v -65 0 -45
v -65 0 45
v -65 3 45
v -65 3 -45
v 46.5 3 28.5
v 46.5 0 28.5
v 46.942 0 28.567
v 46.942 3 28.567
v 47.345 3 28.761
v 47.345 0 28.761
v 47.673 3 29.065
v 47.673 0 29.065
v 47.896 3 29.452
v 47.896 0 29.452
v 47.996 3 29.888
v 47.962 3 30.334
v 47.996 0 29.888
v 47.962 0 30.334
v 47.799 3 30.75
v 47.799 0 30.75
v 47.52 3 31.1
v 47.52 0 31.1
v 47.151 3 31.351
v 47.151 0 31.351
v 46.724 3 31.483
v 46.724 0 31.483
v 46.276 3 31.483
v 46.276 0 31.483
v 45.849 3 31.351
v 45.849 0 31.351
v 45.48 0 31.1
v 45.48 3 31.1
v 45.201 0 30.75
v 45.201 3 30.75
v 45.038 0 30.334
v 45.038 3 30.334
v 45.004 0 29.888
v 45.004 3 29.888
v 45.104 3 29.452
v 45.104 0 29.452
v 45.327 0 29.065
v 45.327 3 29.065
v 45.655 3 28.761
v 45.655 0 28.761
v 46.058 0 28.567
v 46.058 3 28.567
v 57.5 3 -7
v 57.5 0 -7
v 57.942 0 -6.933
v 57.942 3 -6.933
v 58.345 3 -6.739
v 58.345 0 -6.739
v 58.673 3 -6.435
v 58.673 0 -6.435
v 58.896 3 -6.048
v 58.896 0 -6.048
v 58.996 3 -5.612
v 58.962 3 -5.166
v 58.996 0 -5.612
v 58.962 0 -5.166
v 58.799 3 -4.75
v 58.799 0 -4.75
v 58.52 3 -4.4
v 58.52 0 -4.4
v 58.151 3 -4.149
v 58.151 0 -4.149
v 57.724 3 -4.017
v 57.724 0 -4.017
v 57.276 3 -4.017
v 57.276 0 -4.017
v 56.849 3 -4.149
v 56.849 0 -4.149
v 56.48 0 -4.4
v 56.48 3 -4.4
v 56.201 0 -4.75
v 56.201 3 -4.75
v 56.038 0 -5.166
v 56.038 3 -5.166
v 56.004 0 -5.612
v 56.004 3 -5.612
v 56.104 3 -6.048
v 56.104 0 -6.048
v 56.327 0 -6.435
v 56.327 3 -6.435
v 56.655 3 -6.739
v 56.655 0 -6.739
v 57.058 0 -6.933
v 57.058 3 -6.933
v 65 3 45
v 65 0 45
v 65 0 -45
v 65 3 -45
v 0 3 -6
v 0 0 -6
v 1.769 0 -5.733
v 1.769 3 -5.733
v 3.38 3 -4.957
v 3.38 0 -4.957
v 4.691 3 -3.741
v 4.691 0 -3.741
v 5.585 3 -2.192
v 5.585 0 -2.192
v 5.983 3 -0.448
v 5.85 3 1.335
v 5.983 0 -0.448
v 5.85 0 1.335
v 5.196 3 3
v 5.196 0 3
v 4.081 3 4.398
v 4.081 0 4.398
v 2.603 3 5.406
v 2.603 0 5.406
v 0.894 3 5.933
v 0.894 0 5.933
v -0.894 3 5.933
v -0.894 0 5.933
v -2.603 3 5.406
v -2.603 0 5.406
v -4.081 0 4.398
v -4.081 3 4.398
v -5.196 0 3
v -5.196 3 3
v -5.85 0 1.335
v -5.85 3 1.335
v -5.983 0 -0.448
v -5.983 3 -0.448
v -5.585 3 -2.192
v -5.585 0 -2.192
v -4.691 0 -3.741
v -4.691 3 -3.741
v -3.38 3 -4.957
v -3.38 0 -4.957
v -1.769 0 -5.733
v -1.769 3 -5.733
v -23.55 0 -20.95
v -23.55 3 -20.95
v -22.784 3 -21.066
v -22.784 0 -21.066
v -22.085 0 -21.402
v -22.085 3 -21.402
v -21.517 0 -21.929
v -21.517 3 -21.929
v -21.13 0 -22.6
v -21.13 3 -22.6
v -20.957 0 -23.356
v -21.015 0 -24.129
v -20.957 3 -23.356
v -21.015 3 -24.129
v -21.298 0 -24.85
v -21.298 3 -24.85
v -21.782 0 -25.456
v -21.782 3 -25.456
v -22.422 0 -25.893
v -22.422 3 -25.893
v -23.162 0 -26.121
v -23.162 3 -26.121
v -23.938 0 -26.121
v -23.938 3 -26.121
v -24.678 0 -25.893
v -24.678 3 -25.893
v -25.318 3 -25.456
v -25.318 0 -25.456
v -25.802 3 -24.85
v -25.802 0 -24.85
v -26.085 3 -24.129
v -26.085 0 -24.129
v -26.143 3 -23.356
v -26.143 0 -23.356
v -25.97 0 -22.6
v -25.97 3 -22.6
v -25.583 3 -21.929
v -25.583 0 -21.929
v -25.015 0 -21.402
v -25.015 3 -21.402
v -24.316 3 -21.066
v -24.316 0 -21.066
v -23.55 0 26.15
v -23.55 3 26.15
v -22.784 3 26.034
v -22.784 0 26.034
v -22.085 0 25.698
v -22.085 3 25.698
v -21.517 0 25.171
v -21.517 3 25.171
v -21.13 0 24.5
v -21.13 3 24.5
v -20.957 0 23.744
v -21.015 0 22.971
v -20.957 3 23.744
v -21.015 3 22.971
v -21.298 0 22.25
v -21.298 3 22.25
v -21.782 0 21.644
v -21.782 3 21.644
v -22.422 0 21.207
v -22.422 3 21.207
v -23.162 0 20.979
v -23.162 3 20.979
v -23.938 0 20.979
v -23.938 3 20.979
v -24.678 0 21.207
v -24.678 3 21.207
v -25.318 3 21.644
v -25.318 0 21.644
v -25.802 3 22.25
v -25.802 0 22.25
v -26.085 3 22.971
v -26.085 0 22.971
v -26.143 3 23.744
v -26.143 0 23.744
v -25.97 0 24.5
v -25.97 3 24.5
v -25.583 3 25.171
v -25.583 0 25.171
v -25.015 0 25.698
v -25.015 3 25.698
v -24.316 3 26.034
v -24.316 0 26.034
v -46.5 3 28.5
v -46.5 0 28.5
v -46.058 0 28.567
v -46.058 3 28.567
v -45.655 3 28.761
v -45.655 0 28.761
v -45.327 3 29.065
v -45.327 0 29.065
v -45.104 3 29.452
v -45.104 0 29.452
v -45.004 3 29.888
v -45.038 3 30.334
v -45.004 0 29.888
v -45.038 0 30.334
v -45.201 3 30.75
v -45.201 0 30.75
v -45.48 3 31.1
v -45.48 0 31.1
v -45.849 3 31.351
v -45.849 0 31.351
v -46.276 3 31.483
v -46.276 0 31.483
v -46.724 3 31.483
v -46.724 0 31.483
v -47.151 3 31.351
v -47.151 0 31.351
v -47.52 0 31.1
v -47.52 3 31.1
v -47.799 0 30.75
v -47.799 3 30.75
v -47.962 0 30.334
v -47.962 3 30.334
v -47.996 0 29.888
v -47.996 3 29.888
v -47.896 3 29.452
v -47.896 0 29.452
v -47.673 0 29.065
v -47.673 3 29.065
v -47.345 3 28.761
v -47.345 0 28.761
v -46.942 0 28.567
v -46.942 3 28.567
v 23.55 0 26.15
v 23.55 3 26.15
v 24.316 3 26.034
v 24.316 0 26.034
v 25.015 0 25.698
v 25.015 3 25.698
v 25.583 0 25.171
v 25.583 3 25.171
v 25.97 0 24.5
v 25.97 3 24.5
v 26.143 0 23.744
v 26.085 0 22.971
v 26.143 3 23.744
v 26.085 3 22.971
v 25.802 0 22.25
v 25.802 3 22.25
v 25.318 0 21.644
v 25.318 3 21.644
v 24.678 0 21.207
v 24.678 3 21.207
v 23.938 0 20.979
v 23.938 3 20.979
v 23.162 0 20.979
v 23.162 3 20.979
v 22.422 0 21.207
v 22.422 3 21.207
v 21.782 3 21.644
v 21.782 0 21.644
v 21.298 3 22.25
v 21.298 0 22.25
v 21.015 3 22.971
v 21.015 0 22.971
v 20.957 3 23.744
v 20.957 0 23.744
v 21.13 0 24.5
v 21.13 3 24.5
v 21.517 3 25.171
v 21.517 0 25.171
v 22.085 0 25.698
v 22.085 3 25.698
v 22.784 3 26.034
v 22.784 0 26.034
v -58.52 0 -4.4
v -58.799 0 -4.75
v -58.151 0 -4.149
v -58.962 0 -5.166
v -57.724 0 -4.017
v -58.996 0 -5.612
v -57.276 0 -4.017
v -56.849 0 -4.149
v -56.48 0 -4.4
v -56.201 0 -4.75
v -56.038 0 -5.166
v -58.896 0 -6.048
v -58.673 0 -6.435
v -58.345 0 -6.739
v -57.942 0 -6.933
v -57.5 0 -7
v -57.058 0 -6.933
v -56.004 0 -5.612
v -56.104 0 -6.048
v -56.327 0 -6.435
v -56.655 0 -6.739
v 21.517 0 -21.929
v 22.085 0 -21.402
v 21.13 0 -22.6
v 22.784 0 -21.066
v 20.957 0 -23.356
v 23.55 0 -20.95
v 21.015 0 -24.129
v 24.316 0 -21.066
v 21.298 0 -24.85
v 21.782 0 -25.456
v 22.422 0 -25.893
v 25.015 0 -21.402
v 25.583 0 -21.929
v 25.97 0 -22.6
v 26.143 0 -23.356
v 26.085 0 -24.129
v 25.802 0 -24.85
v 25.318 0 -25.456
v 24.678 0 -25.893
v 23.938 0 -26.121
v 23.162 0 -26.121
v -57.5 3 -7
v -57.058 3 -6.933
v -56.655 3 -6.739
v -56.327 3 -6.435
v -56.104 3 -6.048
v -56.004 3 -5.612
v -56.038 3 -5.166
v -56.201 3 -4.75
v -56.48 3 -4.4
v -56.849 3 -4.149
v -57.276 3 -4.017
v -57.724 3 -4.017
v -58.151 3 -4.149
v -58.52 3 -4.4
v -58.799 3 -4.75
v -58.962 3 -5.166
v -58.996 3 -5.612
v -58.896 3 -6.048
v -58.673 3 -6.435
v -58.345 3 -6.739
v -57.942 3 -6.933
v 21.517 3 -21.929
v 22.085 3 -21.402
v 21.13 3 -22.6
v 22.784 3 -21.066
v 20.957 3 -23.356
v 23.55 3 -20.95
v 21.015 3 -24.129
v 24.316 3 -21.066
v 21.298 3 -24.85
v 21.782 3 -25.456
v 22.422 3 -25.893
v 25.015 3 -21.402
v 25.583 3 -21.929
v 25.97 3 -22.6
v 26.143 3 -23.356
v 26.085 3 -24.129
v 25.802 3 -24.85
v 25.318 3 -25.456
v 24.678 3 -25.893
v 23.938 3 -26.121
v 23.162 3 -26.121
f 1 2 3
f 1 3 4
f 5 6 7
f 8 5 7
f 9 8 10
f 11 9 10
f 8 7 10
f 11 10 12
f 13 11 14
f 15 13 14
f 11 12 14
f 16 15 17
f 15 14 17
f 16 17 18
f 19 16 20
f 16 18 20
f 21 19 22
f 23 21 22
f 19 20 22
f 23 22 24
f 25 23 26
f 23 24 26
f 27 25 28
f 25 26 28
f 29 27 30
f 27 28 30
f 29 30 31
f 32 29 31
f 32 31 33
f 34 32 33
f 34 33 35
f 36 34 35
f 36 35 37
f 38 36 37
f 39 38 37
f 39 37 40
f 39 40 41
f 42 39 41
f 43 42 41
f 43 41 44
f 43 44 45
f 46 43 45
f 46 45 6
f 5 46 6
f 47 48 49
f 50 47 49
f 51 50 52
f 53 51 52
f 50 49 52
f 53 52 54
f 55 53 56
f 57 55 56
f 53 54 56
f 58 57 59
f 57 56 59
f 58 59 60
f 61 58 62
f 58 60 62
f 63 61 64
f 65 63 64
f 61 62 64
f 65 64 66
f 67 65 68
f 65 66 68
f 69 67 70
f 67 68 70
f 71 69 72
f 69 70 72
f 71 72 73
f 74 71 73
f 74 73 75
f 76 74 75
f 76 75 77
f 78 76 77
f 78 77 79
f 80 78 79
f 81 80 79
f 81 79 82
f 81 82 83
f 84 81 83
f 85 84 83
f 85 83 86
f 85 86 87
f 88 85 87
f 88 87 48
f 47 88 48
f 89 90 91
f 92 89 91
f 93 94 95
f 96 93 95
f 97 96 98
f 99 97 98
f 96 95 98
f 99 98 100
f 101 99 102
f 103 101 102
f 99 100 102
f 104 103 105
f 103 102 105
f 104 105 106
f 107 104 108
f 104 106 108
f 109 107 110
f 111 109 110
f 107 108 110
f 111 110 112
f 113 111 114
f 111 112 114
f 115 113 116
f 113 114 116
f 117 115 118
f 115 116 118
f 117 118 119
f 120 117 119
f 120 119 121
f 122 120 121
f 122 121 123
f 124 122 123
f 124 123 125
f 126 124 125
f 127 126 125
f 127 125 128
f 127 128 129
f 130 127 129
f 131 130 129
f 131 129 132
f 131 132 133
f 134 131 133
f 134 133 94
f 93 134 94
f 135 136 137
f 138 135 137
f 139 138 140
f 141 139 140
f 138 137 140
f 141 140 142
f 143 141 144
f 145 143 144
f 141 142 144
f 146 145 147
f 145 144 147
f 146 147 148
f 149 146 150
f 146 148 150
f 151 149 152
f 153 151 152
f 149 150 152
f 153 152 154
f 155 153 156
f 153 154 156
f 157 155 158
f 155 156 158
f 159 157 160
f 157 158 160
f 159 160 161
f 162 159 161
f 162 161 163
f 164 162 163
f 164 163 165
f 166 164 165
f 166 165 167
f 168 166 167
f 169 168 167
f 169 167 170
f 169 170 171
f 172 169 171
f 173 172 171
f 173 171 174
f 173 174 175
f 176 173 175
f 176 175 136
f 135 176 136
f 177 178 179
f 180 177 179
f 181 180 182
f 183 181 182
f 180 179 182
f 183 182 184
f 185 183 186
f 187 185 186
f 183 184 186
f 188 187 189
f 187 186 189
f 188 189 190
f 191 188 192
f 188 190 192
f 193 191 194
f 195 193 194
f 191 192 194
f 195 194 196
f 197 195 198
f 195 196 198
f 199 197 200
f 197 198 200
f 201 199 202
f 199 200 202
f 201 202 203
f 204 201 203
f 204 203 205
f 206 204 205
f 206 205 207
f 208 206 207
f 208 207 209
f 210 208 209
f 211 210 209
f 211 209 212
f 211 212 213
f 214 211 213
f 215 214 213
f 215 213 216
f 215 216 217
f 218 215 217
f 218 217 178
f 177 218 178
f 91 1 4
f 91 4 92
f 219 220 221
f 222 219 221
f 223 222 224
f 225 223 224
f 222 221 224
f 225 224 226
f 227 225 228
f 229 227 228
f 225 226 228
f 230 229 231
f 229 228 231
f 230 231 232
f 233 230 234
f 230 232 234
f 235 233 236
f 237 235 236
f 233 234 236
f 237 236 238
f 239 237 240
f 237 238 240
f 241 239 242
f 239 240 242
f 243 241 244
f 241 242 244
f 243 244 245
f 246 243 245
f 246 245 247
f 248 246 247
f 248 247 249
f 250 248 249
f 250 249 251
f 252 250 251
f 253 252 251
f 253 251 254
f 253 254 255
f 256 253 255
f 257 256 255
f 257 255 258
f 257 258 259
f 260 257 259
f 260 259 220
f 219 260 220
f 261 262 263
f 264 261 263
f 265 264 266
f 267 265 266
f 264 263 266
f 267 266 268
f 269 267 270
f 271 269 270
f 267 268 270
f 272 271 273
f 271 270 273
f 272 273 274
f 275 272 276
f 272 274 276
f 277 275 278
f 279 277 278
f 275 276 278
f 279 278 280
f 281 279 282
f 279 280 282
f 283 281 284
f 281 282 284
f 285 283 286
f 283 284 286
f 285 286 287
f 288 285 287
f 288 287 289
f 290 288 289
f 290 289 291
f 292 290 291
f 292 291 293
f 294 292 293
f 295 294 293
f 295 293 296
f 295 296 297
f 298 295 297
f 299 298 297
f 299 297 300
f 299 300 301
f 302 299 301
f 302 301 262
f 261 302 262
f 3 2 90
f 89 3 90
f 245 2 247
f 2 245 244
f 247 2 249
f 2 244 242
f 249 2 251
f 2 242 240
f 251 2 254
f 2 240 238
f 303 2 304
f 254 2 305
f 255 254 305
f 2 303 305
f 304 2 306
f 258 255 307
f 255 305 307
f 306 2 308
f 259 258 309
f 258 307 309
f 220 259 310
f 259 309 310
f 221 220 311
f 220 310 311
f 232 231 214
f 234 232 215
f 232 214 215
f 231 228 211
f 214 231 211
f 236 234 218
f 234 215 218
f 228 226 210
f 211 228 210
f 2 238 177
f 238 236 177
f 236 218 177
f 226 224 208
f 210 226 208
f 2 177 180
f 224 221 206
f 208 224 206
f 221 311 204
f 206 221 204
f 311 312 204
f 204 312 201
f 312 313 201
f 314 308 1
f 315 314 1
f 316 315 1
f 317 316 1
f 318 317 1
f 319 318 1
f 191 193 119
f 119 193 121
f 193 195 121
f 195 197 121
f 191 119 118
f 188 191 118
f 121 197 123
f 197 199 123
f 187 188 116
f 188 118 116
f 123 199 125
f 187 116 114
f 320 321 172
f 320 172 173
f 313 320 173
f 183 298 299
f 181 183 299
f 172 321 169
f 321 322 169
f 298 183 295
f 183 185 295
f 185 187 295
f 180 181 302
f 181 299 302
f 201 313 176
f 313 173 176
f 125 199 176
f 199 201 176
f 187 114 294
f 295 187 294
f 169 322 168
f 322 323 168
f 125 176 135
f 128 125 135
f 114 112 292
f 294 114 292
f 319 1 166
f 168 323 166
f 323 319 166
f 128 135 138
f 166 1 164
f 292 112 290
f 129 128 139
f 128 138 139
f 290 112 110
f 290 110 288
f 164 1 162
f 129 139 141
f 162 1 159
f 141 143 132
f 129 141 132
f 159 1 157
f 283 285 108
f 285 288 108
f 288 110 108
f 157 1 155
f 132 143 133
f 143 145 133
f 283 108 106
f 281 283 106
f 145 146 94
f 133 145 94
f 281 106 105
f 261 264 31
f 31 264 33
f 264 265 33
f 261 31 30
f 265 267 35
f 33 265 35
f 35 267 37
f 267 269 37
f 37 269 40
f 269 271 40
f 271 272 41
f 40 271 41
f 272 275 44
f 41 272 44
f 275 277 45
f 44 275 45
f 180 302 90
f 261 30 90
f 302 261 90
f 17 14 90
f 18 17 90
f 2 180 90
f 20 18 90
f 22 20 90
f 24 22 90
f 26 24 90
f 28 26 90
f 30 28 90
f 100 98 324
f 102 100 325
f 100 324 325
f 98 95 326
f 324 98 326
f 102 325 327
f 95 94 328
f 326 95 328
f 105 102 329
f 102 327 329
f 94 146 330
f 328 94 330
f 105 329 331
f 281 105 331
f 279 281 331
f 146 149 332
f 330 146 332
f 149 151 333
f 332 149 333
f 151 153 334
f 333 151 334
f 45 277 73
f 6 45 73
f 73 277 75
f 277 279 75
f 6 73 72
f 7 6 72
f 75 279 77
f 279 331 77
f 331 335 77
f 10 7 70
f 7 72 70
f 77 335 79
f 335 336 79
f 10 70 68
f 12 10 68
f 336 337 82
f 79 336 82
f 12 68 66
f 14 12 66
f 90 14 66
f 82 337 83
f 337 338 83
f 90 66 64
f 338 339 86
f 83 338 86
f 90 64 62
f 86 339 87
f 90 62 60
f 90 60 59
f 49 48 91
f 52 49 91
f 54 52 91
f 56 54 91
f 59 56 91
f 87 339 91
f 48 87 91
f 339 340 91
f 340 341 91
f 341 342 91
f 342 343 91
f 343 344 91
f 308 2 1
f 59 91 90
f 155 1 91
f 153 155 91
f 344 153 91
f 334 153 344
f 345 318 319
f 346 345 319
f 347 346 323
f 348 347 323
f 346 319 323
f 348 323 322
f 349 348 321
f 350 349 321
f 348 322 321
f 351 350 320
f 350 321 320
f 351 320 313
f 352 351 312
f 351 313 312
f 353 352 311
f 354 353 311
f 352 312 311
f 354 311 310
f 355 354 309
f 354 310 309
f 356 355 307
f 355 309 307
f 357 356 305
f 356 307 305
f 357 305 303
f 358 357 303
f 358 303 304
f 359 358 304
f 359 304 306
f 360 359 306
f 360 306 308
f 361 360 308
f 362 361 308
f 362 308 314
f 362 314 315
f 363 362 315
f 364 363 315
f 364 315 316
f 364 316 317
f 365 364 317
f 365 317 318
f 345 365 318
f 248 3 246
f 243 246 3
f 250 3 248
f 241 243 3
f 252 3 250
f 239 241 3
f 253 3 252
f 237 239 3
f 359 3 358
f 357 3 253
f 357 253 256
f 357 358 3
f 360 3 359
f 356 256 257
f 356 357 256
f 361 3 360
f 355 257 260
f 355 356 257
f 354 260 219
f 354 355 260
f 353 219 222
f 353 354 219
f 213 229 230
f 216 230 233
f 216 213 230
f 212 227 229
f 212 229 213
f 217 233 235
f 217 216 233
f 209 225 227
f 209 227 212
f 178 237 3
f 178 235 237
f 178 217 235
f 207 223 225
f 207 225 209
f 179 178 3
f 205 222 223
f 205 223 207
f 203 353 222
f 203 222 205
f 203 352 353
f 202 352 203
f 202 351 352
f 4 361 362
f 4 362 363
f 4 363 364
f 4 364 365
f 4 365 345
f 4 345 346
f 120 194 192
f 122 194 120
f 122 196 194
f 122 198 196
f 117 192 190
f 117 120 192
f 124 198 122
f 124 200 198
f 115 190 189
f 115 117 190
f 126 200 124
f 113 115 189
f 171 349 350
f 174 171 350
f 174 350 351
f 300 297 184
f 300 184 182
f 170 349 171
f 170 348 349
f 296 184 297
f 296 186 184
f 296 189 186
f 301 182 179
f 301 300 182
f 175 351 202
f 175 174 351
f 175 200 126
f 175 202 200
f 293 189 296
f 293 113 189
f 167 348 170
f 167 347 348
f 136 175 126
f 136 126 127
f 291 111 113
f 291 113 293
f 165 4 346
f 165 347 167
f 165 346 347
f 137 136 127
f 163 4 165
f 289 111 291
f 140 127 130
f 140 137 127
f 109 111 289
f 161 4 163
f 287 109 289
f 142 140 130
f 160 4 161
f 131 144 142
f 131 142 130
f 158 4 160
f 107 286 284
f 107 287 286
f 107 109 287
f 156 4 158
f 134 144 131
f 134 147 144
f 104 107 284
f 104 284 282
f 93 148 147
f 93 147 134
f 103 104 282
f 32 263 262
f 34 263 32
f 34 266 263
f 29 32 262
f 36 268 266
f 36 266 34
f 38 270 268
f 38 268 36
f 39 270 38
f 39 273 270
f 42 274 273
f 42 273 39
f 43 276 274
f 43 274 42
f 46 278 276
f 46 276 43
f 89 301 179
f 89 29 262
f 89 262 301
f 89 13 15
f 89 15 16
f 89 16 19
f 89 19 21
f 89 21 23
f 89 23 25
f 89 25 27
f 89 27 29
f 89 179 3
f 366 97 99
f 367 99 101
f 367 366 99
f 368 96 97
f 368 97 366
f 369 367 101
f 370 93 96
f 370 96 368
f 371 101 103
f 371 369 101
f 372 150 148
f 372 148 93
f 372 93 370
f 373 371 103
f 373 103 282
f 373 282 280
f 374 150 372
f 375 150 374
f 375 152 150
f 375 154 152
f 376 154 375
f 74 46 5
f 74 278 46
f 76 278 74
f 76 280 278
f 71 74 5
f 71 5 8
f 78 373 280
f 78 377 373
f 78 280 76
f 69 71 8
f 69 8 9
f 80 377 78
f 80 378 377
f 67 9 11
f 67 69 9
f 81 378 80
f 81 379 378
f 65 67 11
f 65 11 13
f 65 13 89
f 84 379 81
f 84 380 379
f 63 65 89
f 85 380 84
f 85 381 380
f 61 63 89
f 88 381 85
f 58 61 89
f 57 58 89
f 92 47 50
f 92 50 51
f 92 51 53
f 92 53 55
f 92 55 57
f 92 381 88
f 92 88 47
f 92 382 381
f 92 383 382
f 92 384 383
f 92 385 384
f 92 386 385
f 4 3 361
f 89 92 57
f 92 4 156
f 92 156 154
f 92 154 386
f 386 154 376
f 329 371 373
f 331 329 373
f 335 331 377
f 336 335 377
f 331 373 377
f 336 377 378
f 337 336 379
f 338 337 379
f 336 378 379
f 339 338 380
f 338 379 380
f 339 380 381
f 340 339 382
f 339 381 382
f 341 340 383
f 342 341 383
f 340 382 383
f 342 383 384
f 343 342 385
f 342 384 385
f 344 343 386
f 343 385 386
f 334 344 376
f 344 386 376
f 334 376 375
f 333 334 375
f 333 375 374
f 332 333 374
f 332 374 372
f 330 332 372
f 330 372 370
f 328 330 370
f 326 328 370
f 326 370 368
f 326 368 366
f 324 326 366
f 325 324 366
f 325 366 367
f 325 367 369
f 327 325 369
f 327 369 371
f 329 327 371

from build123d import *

# Parameters (mm, degrees)
SKETCH1_W           = 130
SKETCH1_H           = 90
BOSS_EXTRUDE1_DEPTH = 3
SKETCH2_R           = 2.6
CUT_EXTRUDE1_DEPTH  = 10
SKETCH3_R           = 1.5
CUT_EXTRUDE2_DEPTH  = 10
SKETCH4_R           = 6
CUT_EXTRUDE3_DEPTH  = 10


with BuildPart() as part:
    # Sketch1 → Boss-Extrude1 (new body)
    with BuildSketch(Plane(origin=(0, 0, 0), x_dir=(1, 0, 0), z_dir=(0, 1, 0))):
        Rectangle(SKETCH1_W, SKETCH1_H)
    extrude(amount=BOSS_EXTRUDE1_DEPTH)

    # Sketch2 → Cut-Extrude1 (cut)
    with BuildSketch(Plane(origin=(0, 3, 0), x_dir=(1, 0, 0), z_dir=(0, 1, 0))):
        with Locations(Location((23.55, -23.55, 0), (0, 0, 270))):
            Circle(SKETCH2_R)
        with Locations(Location((-23.55, -23.55, 0), (0, 0, 270))):
            Circle(SKETCH2_R)
        with Locations(Location((-23.55, 23.55, 0), (0, 0, 270))):
            Circle(SKETCH2_R)
        with Locations(Location((23.55, 23.55, 0), (0, 0, 270))):
            Circle(SKETCH2_R)
    extrude(amount=-CUT_EXTRUDE1_DEPTH, mode=Mode.SUBTRACT)

    # Sketch3 → Cut-Extrude2 (cut)
    with BuildSketch(Plane.XZ):
        with Locations(Location((46.5, 30, 0), (0, 0, 270))):
            Circle(SKETCH3_R)
        with Locations(Location((-46.5, 30, 0), (0, 0, 270))):
            Circle(SKETCH3_R)
        with Locations(Location((-57.5, -5.5, 0), (0, 0, 270))):
            Circle(SKETCH3_R)
        with Locations(Location((57.5, -5.5, 0), (0, 0, 270))):
            Circle(SKETCH3_R)
    extrude(amount=-CUT_EXTRUDE2_DEPTH, mode=Mode.SUBTRACT)

    # Sketch4 → Cut-Extrude3 (cut)
    with BuildSketch(Plane.XZ):
        with Locations(Location((0, 0, 0), (0, 0, 270))):
            Circle(SKETCH4_R)
    extrude(amount=-CUT_EXTRUDE3_DEPTH, mode=Mode.SUBTRACT)


solid = part.part
